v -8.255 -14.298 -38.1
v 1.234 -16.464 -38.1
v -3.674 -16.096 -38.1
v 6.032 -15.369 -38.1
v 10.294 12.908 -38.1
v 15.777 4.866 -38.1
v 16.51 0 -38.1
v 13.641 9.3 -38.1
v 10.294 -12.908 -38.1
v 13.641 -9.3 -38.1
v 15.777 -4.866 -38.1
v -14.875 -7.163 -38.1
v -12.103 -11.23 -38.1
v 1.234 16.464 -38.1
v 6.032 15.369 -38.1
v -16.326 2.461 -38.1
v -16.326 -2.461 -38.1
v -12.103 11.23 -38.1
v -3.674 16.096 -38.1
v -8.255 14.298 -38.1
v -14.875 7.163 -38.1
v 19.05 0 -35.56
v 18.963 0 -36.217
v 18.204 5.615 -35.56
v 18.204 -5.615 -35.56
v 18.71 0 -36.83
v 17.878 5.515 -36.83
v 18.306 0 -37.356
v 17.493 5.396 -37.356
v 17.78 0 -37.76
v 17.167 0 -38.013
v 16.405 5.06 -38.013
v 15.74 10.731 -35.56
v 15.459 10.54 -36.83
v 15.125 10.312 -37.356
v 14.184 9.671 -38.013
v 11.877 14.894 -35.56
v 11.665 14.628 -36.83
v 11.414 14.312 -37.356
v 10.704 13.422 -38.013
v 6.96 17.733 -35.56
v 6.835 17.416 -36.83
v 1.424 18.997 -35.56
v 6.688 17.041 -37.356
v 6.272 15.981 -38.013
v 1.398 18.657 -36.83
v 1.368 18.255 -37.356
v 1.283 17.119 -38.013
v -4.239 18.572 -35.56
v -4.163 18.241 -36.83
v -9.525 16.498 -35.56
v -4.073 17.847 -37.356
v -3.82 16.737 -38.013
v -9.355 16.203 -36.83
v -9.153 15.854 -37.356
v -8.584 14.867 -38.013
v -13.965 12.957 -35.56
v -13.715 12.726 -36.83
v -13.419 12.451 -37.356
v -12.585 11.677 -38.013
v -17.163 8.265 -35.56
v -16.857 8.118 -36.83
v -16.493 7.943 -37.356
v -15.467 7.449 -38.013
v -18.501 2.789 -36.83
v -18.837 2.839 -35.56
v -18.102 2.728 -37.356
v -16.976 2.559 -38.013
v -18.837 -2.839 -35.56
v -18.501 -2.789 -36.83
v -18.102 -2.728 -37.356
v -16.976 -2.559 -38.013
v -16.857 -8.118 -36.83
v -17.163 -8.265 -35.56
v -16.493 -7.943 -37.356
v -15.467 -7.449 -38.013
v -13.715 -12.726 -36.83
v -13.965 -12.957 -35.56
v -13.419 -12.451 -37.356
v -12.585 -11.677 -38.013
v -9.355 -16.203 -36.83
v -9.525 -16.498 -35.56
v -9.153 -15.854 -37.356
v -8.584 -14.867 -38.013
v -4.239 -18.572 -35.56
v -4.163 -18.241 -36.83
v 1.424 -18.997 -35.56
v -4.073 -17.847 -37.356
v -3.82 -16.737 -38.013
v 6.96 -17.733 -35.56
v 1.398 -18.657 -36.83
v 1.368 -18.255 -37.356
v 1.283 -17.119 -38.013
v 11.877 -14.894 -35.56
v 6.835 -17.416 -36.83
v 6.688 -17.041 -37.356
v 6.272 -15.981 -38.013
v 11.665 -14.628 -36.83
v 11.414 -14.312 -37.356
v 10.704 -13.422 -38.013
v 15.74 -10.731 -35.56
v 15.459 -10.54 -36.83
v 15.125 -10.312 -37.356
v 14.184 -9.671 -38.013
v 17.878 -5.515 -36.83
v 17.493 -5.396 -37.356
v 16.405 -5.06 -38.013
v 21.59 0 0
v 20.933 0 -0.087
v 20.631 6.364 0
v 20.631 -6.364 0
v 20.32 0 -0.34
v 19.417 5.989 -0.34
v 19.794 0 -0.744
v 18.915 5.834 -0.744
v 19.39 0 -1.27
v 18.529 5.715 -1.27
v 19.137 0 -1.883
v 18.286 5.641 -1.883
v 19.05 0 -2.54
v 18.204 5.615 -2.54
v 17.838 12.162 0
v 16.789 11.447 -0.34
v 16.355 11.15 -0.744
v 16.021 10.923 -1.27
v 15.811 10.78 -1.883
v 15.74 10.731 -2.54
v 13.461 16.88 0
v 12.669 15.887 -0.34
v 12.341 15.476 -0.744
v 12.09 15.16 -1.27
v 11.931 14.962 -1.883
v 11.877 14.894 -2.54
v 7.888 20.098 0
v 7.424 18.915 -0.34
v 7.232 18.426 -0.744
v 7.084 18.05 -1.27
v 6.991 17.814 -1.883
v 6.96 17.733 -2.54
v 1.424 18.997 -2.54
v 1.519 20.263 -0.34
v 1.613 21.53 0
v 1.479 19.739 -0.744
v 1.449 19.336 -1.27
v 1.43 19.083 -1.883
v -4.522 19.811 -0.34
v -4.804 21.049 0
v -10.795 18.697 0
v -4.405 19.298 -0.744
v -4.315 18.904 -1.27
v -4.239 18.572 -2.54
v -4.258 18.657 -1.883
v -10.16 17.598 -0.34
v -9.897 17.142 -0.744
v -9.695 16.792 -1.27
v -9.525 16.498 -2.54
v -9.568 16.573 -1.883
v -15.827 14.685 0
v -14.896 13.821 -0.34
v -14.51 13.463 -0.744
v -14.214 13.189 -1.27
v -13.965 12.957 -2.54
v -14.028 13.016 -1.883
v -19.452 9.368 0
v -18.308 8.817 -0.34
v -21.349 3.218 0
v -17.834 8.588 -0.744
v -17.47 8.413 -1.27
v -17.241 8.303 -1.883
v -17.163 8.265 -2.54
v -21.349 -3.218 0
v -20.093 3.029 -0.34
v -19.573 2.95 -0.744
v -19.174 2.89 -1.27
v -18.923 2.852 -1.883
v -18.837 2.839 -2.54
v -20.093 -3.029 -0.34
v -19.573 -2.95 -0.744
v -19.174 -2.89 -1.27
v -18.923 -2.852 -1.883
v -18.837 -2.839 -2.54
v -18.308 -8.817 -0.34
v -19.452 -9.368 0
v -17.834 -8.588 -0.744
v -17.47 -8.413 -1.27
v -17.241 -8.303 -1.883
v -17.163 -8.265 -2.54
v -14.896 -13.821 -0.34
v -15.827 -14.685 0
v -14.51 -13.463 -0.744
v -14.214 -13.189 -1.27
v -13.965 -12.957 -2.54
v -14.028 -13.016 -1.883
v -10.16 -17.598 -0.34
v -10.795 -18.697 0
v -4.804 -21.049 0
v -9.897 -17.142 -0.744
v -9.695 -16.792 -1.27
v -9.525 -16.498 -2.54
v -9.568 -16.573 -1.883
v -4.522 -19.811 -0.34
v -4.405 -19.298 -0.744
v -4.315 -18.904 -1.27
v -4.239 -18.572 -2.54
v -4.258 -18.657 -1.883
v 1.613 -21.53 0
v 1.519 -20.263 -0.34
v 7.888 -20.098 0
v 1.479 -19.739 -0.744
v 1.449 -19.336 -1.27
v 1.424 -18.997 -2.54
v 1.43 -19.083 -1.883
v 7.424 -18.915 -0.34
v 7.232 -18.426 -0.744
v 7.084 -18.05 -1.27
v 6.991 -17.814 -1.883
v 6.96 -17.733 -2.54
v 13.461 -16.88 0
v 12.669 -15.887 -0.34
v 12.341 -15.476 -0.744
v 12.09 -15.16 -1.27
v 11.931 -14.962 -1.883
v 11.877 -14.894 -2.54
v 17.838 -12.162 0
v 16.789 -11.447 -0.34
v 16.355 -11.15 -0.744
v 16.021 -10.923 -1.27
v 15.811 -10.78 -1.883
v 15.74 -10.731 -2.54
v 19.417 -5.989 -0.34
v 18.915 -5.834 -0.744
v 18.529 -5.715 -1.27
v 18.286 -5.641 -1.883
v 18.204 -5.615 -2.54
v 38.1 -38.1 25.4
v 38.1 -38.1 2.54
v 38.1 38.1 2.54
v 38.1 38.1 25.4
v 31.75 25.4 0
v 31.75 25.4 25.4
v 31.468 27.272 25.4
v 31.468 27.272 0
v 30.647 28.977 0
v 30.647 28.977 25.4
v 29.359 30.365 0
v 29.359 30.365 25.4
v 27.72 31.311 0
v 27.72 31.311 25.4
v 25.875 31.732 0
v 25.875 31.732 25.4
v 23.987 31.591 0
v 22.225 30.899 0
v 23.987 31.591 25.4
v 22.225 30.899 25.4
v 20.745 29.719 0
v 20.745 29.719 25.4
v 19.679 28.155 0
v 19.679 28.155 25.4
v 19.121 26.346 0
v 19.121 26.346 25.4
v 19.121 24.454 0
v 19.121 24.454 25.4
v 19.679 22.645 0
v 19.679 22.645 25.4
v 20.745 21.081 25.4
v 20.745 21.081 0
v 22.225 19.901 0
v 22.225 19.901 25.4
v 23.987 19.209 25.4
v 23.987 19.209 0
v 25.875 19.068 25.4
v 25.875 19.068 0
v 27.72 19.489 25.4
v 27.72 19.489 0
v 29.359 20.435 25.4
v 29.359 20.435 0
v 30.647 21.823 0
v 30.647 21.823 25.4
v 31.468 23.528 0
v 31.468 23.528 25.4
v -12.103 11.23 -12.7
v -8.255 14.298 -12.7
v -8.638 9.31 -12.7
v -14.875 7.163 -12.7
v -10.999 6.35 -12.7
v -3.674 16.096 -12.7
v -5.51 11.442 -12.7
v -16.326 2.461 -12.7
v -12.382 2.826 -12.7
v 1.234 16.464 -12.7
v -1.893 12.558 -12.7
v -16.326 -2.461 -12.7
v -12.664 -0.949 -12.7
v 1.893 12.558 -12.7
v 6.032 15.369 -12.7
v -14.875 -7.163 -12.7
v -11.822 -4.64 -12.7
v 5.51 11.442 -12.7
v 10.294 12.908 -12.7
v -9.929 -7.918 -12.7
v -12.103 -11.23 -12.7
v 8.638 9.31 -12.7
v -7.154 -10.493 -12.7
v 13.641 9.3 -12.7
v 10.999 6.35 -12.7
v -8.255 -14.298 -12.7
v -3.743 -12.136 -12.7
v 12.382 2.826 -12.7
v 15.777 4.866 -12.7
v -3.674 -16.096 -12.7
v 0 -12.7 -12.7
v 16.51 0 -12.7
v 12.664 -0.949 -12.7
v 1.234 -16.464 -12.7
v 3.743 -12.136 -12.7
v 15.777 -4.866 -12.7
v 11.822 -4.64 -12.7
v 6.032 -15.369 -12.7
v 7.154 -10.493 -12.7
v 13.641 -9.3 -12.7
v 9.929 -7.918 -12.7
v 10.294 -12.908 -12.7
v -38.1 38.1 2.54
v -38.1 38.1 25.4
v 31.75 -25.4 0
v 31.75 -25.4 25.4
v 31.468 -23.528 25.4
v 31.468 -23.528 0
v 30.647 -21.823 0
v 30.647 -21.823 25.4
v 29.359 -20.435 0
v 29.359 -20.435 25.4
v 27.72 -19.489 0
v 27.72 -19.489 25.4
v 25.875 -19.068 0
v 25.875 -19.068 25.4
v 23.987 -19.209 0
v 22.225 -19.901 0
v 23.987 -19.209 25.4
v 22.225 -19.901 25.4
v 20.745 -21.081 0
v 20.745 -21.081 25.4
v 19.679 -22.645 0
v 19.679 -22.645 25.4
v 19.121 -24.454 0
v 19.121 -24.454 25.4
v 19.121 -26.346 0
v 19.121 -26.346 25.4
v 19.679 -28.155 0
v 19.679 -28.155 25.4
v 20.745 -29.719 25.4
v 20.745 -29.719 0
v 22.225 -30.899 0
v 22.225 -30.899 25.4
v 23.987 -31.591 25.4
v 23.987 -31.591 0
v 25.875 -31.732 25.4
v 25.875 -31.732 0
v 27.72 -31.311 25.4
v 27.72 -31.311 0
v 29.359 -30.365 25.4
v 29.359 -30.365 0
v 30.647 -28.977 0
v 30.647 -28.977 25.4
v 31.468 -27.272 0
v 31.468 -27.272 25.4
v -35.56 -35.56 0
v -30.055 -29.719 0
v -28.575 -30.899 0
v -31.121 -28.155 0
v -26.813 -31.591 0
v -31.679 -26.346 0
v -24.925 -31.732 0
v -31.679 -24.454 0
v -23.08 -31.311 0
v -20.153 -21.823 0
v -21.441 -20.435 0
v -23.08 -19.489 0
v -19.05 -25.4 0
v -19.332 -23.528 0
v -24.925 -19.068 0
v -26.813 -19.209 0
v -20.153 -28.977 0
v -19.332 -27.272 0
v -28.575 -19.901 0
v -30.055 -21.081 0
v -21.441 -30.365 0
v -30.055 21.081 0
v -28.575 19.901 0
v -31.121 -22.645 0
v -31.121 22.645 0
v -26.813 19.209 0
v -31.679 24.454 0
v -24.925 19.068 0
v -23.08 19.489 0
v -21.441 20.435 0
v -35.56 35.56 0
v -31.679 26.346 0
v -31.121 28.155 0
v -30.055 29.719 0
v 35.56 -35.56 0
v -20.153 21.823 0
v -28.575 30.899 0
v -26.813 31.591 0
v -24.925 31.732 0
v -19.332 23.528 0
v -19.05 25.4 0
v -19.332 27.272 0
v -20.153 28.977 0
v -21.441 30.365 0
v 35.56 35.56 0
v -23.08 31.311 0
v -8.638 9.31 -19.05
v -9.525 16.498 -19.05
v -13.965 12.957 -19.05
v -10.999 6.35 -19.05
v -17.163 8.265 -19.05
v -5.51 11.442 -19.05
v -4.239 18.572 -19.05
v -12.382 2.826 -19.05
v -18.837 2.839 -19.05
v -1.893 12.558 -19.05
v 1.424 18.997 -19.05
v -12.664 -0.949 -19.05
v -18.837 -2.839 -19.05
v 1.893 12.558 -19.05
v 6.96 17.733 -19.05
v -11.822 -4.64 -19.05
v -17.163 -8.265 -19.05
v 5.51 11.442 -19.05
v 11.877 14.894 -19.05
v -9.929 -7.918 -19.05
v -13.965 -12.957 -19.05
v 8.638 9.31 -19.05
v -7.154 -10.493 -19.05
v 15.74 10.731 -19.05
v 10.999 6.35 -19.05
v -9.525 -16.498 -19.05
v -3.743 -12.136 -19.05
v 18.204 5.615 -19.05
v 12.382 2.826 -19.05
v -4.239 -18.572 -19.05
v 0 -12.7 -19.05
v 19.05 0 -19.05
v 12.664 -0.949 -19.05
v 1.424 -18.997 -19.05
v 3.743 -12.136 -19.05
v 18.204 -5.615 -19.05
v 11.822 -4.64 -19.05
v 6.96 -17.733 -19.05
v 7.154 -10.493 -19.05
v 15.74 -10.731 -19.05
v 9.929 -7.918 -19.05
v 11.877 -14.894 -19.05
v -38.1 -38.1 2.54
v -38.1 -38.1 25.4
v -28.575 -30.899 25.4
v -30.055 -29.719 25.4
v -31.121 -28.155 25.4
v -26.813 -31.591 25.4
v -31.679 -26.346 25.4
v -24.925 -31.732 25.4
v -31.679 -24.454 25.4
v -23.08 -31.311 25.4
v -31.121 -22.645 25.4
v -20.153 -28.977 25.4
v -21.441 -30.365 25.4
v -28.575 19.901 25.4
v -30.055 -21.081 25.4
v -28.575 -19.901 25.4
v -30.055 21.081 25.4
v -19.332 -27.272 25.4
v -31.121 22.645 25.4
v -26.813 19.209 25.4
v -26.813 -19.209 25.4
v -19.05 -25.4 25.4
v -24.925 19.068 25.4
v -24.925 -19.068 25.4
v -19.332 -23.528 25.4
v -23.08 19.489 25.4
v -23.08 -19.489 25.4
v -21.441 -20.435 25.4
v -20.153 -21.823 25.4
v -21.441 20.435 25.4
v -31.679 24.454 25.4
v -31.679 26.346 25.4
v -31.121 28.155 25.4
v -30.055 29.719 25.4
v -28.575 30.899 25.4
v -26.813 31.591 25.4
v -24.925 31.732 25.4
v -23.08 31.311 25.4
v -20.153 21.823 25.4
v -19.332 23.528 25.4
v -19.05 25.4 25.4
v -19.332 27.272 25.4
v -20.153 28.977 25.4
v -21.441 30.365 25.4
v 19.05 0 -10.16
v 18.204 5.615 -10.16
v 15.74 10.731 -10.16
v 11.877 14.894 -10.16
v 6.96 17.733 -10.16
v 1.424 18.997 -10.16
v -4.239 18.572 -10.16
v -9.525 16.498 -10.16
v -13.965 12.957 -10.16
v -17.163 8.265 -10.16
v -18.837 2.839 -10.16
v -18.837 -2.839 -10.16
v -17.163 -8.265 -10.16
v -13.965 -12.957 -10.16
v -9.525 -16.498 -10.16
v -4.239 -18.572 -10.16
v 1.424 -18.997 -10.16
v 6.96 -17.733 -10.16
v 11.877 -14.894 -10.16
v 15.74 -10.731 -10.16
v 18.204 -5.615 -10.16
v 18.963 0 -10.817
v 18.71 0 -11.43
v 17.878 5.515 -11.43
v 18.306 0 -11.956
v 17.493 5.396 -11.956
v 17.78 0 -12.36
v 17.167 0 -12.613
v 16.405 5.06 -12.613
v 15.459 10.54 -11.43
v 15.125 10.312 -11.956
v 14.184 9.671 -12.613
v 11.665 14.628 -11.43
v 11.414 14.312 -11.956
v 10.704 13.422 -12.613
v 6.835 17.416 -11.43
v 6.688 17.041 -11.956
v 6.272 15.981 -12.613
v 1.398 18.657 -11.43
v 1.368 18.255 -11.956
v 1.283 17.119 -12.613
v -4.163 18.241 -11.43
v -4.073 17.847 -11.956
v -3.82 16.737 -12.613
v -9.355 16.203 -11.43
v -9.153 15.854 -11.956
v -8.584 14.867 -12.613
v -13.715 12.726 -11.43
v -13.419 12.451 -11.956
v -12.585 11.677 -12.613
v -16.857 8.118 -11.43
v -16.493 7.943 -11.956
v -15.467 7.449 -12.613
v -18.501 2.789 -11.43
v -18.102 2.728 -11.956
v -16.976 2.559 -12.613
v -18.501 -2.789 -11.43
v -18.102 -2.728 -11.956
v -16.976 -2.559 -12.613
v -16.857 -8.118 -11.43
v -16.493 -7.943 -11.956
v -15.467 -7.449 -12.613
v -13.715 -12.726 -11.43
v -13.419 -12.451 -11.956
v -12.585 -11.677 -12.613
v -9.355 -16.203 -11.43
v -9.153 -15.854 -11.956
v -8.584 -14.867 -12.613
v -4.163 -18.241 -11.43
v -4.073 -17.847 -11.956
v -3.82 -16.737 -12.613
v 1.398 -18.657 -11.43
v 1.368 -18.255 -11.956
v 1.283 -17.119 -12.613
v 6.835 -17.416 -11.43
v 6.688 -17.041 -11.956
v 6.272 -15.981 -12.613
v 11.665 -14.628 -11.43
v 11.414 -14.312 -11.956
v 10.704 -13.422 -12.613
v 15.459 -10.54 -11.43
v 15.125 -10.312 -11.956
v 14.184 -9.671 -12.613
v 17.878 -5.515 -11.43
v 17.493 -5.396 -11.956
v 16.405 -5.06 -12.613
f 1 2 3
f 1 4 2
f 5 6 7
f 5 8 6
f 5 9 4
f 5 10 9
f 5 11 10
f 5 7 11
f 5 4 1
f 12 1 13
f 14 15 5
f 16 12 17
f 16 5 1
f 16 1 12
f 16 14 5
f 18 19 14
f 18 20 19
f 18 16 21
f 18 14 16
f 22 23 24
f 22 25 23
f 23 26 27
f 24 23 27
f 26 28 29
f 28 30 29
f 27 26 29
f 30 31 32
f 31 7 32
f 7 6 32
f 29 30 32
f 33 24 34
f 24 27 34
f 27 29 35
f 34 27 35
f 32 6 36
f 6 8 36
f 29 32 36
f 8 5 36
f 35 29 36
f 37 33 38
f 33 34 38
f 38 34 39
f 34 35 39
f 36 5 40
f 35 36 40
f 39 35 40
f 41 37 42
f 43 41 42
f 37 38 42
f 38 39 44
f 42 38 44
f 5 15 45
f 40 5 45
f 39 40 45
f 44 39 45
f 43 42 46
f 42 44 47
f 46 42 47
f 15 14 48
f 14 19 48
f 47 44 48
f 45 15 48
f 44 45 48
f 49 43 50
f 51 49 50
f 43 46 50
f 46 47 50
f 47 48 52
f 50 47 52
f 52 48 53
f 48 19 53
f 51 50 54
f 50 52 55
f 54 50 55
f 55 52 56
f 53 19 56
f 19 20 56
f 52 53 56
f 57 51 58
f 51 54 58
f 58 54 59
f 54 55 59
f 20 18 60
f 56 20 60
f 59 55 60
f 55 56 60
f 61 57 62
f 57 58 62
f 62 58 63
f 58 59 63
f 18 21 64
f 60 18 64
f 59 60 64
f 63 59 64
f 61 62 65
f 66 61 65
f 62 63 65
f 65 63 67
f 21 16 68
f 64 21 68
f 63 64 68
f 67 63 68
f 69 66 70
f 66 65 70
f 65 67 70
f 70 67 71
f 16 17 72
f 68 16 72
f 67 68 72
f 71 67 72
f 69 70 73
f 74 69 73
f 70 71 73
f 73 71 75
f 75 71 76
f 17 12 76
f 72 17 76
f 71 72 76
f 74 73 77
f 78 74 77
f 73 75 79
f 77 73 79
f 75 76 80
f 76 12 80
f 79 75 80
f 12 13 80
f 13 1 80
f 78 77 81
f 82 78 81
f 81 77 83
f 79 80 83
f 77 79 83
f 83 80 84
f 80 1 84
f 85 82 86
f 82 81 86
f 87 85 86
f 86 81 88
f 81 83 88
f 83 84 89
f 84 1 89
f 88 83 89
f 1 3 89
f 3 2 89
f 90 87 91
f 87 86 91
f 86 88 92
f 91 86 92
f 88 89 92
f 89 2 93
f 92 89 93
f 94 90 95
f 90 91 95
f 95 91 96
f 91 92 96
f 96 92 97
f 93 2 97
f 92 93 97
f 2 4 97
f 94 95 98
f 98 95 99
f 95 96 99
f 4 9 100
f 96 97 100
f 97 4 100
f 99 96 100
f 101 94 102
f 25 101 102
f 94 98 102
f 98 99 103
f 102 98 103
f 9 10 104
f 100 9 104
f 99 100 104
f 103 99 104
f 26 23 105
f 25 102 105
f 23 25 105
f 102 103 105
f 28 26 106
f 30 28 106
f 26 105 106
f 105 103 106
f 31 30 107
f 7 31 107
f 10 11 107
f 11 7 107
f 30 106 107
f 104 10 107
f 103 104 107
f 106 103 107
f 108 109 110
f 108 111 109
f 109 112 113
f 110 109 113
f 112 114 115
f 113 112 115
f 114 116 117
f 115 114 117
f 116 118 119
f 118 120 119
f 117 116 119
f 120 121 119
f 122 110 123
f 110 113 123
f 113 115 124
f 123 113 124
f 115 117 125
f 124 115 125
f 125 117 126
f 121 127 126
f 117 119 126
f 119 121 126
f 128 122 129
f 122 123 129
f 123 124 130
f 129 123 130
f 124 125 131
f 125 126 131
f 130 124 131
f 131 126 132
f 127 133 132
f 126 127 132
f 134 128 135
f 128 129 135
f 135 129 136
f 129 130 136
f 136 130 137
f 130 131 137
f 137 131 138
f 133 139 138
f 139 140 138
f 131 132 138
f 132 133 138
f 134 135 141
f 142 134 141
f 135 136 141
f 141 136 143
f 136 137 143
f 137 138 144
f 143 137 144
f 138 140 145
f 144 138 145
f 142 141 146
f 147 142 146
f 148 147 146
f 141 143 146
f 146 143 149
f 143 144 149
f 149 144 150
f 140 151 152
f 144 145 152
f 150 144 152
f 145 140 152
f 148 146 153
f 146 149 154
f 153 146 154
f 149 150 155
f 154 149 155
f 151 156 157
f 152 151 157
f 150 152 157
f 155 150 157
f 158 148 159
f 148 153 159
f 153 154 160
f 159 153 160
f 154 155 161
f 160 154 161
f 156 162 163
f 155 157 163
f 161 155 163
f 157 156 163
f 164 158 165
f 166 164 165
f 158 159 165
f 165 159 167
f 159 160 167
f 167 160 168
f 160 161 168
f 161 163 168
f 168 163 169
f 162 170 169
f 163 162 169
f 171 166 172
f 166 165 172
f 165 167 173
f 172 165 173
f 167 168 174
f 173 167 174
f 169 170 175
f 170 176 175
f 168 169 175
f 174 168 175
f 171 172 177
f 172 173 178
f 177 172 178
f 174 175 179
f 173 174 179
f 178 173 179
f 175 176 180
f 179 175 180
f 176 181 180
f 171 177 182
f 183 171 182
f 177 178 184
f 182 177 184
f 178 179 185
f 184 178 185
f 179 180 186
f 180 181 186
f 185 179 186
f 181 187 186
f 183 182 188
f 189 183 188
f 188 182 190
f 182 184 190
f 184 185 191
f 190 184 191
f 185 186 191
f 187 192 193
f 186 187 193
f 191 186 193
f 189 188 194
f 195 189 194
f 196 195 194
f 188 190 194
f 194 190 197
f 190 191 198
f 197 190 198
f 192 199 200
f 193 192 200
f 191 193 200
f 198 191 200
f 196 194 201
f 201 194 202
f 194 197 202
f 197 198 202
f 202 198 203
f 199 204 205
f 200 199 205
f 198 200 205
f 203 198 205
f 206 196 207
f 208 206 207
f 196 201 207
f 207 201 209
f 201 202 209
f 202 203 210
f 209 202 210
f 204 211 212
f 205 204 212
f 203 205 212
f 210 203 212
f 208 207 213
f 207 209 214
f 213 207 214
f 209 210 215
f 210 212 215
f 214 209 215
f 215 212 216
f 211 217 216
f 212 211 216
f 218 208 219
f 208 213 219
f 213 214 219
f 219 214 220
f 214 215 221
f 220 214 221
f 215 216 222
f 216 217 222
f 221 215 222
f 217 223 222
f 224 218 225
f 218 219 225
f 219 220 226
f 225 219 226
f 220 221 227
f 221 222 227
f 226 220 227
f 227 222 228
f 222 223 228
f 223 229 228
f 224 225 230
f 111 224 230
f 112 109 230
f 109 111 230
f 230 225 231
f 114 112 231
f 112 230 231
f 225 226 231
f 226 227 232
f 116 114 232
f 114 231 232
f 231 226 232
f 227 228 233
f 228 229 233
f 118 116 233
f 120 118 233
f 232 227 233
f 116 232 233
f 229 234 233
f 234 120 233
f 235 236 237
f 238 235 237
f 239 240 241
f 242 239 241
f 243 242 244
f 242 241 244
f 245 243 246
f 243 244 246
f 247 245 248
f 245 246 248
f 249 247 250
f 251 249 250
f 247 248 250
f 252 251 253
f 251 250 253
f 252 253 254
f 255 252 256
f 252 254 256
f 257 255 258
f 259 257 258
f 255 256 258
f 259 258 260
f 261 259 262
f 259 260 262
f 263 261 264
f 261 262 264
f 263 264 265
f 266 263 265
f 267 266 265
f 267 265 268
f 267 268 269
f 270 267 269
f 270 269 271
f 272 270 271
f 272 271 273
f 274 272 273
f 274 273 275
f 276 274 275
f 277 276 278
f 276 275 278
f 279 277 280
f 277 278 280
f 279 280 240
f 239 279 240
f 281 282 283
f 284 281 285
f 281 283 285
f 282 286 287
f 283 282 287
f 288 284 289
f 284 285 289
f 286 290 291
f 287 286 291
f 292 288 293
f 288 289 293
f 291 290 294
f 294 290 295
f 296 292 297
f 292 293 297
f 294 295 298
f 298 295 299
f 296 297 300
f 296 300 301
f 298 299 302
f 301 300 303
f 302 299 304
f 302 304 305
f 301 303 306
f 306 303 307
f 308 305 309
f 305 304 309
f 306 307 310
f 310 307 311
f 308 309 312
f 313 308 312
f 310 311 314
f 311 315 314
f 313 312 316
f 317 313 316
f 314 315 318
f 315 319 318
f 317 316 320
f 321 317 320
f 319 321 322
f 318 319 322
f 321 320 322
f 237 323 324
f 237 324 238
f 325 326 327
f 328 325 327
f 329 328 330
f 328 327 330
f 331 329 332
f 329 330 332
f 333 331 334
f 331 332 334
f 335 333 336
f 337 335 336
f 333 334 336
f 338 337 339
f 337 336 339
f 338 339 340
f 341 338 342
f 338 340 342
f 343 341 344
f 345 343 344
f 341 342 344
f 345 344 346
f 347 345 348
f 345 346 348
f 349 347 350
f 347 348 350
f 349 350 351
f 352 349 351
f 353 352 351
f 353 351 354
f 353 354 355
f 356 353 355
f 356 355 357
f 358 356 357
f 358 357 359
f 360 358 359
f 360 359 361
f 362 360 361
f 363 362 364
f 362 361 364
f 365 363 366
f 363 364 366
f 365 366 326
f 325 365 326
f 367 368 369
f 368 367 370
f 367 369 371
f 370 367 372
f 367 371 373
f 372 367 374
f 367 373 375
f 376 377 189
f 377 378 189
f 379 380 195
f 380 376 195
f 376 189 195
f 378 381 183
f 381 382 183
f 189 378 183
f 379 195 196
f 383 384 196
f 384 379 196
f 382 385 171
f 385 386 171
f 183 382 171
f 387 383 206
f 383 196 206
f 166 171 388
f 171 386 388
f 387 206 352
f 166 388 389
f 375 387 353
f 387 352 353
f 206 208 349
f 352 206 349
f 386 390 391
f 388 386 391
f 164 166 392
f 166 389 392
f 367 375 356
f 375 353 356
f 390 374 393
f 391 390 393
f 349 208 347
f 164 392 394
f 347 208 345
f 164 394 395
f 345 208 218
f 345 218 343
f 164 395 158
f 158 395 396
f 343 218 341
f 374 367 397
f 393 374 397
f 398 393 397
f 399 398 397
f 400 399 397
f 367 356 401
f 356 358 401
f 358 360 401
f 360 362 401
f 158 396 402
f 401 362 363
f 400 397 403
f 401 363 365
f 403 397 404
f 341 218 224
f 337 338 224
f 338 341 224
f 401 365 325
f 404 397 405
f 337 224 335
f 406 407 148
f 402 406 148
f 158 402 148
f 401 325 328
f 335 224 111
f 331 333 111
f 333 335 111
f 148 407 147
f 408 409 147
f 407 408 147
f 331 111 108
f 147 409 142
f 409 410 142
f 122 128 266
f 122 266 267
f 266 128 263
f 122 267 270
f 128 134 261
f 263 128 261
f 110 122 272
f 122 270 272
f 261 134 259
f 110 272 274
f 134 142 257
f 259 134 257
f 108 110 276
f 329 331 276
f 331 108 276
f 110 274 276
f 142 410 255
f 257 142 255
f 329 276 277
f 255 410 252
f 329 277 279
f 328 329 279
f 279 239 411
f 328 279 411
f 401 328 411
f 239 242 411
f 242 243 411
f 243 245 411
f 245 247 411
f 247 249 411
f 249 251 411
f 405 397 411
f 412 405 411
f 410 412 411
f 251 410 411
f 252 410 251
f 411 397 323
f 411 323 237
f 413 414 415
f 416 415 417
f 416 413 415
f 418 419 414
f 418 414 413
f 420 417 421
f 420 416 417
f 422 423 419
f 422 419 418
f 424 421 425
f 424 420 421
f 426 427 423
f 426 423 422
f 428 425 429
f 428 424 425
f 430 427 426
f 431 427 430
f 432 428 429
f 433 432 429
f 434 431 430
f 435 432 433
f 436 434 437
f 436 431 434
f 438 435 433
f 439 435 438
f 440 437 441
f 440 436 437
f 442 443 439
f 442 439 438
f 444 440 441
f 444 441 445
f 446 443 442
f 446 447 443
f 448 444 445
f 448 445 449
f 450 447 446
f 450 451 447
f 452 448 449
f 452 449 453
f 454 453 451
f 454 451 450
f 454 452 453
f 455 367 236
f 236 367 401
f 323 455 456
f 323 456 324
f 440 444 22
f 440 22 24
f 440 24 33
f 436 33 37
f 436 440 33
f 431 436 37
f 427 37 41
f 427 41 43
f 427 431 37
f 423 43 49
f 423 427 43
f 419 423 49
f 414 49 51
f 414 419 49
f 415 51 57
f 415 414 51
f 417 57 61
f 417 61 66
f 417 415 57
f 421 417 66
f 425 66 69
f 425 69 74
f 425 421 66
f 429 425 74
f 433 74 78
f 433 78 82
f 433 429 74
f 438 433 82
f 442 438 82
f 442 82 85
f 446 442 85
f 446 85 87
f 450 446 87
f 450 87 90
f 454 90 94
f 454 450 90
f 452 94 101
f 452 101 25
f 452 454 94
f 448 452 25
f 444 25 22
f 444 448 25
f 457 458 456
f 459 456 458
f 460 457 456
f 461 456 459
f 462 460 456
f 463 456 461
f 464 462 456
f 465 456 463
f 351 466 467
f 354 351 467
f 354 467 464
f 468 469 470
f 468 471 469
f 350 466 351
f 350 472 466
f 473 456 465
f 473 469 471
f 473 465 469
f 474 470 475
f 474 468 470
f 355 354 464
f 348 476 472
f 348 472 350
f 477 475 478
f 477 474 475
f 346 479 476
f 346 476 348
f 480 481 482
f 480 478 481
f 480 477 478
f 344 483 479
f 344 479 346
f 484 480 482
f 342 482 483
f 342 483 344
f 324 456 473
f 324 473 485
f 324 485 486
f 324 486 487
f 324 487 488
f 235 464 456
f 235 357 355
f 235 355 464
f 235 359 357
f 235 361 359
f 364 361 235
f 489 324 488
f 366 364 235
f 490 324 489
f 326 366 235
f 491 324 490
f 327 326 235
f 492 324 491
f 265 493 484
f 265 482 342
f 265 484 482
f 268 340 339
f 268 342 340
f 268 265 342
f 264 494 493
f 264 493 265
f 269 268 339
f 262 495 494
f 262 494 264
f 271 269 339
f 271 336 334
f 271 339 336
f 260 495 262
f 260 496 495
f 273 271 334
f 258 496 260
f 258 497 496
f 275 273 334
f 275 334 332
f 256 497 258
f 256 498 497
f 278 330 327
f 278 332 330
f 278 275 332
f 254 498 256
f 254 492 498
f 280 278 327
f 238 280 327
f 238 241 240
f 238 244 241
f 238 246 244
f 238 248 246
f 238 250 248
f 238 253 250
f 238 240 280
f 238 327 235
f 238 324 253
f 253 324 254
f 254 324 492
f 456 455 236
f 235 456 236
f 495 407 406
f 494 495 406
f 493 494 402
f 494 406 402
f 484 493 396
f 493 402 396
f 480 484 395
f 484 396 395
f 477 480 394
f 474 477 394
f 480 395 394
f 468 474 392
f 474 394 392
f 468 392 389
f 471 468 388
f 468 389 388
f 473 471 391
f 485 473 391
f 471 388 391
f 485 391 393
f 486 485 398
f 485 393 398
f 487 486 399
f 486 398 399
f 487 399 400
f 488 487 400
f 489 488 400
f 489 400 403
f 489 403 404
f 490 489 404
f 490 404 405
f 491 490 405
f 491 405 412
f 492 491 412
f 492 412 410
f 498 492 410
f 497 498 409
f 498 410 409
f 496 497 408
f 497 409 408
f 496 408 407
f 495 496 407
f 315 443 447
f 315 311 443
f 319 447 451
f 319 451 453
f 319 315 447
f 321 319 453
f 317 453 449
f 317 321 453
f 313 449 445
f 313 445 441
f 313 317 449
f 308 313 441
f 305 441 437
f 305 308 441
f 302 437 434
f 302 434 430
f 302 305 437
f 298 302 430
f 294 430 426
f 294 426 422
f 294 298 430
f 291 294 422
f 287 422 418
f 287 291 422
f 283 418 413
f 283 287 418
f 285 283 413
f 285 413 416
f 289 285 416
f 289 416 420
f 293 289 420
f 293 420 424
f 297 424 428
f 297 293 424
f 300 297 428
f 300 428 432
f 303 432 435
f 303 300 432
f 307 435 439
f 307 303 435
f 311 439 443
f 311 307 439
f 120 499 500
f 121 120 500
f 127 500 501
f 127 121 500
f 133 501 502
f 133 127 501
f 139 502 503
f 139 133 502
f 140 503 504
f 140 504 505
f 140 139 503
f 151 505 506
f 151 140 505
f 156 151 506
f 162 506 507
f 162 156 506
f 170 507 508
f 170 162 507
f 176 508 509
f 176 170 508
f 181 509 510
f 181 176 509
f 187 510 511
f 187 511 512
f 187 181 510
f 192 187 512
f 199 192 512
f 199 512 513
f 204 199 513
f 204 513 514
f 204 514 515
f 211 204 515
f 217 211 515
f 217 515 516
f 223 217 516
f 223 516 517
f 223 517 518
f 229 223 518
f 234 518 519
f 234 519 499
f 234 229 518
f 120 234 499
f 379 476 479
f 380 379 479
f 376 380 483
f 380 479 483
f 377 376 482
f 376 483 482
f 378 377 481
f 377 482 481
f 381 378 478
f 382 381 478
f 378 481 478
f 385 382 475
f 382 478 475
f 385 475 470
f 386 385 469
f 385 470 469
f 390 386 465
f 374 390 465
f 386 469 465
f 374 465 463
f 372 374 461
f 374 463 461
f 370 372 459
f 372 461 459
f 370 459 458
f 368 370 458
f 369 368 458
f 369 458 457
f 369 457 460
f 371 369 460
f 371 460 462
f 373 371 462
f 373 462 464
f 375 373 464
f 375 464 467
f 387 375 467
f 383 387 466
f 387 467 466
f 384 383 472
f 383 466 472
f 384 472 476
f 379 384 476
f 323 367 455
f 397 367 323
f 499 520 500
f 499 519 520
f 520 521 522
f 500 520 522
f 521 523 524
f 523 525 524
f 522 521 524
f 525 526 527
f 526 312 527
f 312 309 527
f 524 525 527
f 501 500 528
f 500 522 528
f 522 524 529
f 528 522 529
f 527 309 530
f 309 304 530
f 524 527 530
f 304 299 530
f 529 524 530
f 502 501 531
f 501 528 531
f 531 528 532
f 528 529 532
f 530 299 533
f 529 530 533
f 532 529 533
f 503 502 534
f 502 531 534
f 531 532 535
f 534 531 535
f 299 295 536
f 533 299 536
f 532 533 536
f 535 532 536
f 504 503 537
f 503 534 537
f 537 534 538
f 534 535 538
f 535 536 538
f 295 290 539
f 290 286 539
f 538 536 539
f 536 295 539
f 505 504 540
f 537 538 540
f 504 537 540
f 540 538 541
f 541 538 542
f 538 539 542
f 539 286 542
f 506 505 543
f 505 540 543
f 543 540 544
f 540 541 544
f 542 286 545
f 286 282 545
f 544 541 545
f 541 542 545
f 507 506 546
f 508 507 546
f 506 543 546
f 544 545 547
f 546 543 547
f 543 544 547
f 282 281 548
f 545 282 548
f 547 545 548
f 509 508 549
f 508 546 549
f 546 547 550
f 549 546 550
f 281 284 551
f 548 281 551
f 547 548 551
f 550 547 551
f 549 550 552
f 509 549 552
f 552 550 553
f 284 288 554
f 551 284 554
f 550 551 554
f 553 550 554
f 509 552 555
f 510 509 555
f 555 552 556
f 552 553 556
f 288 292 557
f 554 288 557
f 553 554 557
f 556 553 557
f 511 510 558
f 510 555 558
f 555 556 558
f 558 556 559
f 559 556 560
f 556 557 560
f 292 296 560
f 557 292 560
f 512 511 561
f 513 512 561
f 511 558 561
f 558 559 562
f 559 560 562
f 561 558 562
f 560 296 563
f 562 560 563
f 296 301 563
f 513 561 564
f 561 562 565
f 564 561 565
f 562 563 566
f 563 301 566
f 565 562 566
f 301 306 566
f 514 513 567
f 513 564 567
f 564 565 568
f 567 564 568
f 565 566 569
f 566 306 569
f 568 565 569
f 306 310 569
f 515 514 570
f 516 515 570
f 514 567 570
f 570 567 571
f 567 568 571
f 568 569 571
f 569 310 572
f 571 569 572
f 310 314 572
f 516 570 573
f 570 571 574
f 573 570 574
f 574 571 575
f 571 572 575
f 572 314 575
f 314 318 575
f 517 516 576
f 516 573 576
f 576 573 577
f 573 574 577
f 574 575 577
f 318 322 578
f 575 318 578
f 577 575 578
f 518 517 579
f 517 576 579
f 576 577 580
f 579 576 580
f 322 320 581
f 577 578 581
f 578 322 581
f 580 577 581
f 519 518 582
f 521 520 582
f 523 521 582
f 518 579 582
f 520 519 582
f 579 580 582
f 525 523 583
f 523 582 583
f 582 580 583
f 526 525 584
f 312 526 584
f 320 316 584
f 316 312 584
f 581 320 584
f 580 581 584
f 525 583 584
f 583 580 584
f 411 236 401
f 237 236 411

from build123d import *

# Parameters (mm, degrees)
F0_W     = 76.2
F0_H     = 76.2
F1_DEPTH = 25.4
F2_R     = 6.35
F3_DEPTH = 25.4
F4_R     = 6.35
F5_DEPTH = 25.4
F6_W     = 19.05
F6_H     = 38.1
F8_W     = 8.2727996377
F8_H     = 6.35
F10_SIZE = 2.54
F11_R    = 2.54


with BuildPart() as f1:
    # F0 (on Top) → F1 (new body)
    with BuildSketch(Plane.XY):
        Rectangle(F0_W, F0_H)
    extrude(amount=F1_DEPTH)

    # F2 (on face) → F3 (cut)
    with BuildSketch(Plane.XY.offset(25.4)):
        with Locations((25.4, 25.4)):
            Circle(F2_R)
        with Locations((25.4, -25.4)):
            Circle(F2_R)
        with Locations((-25.4, -25.4)):
            Circle(F2_R)
    extrude(amount=-F3_DEPTH, mode=Mode.SUBTRACT)

    # F4 (on face) → F5 (cut)
    with BuildSketch(Plane(origin=(0, 0, 0), x_dir=(1, 0, 0), z_dir=(0, 0, -1))):
        with Locations((-25.4, -25.4)):
            Circle(F4_R)
    extrude(amount=-F5_DEPTH, mode=Mode.SUBTRACT)

    # F6 (on Front) → F7 (revolve)
    with BuildSketch(Plane.XZ):
        with Locations((9.525, -19.05)):
            Rectangle(F6_W, F6_H)
    revolve(axis=Axis((0, 0, -19.05), (0, 0, 1)))

    # F8 (on Right) → F9 (revolve, cut)
    with BuildSketch(Plane.YZ):
        with Locations((-16.8363998188, -15.875)):
            Rectangle(F8_W, F8_H)
    revolve(axis=Axis((0, 0, -38.1), (0, 0, 1)), mode=Mode.SUBTRACT)

    # F10
    f10_edges = [f1.edges().sort_by_distance(p)[0] for p in [
        (-38.1, 0, 0),
        (0, 38.1, 0),
        (38.1, 0, 0),
        (0, -38.1, 0),
    ]]
    chamfer(f10_edges, length=F10_SIZE)

    # F11
    f11_edges = [f1.edges().sort_by_distance(p)[0] for p in [
        (-19.05, 0, -12.7),
        (-19.05, 0, 0),
        (-19.05, 0, -38.1),
    ]]
    fillet(f11_edges, radius=F11_R)


solid = f1.part
